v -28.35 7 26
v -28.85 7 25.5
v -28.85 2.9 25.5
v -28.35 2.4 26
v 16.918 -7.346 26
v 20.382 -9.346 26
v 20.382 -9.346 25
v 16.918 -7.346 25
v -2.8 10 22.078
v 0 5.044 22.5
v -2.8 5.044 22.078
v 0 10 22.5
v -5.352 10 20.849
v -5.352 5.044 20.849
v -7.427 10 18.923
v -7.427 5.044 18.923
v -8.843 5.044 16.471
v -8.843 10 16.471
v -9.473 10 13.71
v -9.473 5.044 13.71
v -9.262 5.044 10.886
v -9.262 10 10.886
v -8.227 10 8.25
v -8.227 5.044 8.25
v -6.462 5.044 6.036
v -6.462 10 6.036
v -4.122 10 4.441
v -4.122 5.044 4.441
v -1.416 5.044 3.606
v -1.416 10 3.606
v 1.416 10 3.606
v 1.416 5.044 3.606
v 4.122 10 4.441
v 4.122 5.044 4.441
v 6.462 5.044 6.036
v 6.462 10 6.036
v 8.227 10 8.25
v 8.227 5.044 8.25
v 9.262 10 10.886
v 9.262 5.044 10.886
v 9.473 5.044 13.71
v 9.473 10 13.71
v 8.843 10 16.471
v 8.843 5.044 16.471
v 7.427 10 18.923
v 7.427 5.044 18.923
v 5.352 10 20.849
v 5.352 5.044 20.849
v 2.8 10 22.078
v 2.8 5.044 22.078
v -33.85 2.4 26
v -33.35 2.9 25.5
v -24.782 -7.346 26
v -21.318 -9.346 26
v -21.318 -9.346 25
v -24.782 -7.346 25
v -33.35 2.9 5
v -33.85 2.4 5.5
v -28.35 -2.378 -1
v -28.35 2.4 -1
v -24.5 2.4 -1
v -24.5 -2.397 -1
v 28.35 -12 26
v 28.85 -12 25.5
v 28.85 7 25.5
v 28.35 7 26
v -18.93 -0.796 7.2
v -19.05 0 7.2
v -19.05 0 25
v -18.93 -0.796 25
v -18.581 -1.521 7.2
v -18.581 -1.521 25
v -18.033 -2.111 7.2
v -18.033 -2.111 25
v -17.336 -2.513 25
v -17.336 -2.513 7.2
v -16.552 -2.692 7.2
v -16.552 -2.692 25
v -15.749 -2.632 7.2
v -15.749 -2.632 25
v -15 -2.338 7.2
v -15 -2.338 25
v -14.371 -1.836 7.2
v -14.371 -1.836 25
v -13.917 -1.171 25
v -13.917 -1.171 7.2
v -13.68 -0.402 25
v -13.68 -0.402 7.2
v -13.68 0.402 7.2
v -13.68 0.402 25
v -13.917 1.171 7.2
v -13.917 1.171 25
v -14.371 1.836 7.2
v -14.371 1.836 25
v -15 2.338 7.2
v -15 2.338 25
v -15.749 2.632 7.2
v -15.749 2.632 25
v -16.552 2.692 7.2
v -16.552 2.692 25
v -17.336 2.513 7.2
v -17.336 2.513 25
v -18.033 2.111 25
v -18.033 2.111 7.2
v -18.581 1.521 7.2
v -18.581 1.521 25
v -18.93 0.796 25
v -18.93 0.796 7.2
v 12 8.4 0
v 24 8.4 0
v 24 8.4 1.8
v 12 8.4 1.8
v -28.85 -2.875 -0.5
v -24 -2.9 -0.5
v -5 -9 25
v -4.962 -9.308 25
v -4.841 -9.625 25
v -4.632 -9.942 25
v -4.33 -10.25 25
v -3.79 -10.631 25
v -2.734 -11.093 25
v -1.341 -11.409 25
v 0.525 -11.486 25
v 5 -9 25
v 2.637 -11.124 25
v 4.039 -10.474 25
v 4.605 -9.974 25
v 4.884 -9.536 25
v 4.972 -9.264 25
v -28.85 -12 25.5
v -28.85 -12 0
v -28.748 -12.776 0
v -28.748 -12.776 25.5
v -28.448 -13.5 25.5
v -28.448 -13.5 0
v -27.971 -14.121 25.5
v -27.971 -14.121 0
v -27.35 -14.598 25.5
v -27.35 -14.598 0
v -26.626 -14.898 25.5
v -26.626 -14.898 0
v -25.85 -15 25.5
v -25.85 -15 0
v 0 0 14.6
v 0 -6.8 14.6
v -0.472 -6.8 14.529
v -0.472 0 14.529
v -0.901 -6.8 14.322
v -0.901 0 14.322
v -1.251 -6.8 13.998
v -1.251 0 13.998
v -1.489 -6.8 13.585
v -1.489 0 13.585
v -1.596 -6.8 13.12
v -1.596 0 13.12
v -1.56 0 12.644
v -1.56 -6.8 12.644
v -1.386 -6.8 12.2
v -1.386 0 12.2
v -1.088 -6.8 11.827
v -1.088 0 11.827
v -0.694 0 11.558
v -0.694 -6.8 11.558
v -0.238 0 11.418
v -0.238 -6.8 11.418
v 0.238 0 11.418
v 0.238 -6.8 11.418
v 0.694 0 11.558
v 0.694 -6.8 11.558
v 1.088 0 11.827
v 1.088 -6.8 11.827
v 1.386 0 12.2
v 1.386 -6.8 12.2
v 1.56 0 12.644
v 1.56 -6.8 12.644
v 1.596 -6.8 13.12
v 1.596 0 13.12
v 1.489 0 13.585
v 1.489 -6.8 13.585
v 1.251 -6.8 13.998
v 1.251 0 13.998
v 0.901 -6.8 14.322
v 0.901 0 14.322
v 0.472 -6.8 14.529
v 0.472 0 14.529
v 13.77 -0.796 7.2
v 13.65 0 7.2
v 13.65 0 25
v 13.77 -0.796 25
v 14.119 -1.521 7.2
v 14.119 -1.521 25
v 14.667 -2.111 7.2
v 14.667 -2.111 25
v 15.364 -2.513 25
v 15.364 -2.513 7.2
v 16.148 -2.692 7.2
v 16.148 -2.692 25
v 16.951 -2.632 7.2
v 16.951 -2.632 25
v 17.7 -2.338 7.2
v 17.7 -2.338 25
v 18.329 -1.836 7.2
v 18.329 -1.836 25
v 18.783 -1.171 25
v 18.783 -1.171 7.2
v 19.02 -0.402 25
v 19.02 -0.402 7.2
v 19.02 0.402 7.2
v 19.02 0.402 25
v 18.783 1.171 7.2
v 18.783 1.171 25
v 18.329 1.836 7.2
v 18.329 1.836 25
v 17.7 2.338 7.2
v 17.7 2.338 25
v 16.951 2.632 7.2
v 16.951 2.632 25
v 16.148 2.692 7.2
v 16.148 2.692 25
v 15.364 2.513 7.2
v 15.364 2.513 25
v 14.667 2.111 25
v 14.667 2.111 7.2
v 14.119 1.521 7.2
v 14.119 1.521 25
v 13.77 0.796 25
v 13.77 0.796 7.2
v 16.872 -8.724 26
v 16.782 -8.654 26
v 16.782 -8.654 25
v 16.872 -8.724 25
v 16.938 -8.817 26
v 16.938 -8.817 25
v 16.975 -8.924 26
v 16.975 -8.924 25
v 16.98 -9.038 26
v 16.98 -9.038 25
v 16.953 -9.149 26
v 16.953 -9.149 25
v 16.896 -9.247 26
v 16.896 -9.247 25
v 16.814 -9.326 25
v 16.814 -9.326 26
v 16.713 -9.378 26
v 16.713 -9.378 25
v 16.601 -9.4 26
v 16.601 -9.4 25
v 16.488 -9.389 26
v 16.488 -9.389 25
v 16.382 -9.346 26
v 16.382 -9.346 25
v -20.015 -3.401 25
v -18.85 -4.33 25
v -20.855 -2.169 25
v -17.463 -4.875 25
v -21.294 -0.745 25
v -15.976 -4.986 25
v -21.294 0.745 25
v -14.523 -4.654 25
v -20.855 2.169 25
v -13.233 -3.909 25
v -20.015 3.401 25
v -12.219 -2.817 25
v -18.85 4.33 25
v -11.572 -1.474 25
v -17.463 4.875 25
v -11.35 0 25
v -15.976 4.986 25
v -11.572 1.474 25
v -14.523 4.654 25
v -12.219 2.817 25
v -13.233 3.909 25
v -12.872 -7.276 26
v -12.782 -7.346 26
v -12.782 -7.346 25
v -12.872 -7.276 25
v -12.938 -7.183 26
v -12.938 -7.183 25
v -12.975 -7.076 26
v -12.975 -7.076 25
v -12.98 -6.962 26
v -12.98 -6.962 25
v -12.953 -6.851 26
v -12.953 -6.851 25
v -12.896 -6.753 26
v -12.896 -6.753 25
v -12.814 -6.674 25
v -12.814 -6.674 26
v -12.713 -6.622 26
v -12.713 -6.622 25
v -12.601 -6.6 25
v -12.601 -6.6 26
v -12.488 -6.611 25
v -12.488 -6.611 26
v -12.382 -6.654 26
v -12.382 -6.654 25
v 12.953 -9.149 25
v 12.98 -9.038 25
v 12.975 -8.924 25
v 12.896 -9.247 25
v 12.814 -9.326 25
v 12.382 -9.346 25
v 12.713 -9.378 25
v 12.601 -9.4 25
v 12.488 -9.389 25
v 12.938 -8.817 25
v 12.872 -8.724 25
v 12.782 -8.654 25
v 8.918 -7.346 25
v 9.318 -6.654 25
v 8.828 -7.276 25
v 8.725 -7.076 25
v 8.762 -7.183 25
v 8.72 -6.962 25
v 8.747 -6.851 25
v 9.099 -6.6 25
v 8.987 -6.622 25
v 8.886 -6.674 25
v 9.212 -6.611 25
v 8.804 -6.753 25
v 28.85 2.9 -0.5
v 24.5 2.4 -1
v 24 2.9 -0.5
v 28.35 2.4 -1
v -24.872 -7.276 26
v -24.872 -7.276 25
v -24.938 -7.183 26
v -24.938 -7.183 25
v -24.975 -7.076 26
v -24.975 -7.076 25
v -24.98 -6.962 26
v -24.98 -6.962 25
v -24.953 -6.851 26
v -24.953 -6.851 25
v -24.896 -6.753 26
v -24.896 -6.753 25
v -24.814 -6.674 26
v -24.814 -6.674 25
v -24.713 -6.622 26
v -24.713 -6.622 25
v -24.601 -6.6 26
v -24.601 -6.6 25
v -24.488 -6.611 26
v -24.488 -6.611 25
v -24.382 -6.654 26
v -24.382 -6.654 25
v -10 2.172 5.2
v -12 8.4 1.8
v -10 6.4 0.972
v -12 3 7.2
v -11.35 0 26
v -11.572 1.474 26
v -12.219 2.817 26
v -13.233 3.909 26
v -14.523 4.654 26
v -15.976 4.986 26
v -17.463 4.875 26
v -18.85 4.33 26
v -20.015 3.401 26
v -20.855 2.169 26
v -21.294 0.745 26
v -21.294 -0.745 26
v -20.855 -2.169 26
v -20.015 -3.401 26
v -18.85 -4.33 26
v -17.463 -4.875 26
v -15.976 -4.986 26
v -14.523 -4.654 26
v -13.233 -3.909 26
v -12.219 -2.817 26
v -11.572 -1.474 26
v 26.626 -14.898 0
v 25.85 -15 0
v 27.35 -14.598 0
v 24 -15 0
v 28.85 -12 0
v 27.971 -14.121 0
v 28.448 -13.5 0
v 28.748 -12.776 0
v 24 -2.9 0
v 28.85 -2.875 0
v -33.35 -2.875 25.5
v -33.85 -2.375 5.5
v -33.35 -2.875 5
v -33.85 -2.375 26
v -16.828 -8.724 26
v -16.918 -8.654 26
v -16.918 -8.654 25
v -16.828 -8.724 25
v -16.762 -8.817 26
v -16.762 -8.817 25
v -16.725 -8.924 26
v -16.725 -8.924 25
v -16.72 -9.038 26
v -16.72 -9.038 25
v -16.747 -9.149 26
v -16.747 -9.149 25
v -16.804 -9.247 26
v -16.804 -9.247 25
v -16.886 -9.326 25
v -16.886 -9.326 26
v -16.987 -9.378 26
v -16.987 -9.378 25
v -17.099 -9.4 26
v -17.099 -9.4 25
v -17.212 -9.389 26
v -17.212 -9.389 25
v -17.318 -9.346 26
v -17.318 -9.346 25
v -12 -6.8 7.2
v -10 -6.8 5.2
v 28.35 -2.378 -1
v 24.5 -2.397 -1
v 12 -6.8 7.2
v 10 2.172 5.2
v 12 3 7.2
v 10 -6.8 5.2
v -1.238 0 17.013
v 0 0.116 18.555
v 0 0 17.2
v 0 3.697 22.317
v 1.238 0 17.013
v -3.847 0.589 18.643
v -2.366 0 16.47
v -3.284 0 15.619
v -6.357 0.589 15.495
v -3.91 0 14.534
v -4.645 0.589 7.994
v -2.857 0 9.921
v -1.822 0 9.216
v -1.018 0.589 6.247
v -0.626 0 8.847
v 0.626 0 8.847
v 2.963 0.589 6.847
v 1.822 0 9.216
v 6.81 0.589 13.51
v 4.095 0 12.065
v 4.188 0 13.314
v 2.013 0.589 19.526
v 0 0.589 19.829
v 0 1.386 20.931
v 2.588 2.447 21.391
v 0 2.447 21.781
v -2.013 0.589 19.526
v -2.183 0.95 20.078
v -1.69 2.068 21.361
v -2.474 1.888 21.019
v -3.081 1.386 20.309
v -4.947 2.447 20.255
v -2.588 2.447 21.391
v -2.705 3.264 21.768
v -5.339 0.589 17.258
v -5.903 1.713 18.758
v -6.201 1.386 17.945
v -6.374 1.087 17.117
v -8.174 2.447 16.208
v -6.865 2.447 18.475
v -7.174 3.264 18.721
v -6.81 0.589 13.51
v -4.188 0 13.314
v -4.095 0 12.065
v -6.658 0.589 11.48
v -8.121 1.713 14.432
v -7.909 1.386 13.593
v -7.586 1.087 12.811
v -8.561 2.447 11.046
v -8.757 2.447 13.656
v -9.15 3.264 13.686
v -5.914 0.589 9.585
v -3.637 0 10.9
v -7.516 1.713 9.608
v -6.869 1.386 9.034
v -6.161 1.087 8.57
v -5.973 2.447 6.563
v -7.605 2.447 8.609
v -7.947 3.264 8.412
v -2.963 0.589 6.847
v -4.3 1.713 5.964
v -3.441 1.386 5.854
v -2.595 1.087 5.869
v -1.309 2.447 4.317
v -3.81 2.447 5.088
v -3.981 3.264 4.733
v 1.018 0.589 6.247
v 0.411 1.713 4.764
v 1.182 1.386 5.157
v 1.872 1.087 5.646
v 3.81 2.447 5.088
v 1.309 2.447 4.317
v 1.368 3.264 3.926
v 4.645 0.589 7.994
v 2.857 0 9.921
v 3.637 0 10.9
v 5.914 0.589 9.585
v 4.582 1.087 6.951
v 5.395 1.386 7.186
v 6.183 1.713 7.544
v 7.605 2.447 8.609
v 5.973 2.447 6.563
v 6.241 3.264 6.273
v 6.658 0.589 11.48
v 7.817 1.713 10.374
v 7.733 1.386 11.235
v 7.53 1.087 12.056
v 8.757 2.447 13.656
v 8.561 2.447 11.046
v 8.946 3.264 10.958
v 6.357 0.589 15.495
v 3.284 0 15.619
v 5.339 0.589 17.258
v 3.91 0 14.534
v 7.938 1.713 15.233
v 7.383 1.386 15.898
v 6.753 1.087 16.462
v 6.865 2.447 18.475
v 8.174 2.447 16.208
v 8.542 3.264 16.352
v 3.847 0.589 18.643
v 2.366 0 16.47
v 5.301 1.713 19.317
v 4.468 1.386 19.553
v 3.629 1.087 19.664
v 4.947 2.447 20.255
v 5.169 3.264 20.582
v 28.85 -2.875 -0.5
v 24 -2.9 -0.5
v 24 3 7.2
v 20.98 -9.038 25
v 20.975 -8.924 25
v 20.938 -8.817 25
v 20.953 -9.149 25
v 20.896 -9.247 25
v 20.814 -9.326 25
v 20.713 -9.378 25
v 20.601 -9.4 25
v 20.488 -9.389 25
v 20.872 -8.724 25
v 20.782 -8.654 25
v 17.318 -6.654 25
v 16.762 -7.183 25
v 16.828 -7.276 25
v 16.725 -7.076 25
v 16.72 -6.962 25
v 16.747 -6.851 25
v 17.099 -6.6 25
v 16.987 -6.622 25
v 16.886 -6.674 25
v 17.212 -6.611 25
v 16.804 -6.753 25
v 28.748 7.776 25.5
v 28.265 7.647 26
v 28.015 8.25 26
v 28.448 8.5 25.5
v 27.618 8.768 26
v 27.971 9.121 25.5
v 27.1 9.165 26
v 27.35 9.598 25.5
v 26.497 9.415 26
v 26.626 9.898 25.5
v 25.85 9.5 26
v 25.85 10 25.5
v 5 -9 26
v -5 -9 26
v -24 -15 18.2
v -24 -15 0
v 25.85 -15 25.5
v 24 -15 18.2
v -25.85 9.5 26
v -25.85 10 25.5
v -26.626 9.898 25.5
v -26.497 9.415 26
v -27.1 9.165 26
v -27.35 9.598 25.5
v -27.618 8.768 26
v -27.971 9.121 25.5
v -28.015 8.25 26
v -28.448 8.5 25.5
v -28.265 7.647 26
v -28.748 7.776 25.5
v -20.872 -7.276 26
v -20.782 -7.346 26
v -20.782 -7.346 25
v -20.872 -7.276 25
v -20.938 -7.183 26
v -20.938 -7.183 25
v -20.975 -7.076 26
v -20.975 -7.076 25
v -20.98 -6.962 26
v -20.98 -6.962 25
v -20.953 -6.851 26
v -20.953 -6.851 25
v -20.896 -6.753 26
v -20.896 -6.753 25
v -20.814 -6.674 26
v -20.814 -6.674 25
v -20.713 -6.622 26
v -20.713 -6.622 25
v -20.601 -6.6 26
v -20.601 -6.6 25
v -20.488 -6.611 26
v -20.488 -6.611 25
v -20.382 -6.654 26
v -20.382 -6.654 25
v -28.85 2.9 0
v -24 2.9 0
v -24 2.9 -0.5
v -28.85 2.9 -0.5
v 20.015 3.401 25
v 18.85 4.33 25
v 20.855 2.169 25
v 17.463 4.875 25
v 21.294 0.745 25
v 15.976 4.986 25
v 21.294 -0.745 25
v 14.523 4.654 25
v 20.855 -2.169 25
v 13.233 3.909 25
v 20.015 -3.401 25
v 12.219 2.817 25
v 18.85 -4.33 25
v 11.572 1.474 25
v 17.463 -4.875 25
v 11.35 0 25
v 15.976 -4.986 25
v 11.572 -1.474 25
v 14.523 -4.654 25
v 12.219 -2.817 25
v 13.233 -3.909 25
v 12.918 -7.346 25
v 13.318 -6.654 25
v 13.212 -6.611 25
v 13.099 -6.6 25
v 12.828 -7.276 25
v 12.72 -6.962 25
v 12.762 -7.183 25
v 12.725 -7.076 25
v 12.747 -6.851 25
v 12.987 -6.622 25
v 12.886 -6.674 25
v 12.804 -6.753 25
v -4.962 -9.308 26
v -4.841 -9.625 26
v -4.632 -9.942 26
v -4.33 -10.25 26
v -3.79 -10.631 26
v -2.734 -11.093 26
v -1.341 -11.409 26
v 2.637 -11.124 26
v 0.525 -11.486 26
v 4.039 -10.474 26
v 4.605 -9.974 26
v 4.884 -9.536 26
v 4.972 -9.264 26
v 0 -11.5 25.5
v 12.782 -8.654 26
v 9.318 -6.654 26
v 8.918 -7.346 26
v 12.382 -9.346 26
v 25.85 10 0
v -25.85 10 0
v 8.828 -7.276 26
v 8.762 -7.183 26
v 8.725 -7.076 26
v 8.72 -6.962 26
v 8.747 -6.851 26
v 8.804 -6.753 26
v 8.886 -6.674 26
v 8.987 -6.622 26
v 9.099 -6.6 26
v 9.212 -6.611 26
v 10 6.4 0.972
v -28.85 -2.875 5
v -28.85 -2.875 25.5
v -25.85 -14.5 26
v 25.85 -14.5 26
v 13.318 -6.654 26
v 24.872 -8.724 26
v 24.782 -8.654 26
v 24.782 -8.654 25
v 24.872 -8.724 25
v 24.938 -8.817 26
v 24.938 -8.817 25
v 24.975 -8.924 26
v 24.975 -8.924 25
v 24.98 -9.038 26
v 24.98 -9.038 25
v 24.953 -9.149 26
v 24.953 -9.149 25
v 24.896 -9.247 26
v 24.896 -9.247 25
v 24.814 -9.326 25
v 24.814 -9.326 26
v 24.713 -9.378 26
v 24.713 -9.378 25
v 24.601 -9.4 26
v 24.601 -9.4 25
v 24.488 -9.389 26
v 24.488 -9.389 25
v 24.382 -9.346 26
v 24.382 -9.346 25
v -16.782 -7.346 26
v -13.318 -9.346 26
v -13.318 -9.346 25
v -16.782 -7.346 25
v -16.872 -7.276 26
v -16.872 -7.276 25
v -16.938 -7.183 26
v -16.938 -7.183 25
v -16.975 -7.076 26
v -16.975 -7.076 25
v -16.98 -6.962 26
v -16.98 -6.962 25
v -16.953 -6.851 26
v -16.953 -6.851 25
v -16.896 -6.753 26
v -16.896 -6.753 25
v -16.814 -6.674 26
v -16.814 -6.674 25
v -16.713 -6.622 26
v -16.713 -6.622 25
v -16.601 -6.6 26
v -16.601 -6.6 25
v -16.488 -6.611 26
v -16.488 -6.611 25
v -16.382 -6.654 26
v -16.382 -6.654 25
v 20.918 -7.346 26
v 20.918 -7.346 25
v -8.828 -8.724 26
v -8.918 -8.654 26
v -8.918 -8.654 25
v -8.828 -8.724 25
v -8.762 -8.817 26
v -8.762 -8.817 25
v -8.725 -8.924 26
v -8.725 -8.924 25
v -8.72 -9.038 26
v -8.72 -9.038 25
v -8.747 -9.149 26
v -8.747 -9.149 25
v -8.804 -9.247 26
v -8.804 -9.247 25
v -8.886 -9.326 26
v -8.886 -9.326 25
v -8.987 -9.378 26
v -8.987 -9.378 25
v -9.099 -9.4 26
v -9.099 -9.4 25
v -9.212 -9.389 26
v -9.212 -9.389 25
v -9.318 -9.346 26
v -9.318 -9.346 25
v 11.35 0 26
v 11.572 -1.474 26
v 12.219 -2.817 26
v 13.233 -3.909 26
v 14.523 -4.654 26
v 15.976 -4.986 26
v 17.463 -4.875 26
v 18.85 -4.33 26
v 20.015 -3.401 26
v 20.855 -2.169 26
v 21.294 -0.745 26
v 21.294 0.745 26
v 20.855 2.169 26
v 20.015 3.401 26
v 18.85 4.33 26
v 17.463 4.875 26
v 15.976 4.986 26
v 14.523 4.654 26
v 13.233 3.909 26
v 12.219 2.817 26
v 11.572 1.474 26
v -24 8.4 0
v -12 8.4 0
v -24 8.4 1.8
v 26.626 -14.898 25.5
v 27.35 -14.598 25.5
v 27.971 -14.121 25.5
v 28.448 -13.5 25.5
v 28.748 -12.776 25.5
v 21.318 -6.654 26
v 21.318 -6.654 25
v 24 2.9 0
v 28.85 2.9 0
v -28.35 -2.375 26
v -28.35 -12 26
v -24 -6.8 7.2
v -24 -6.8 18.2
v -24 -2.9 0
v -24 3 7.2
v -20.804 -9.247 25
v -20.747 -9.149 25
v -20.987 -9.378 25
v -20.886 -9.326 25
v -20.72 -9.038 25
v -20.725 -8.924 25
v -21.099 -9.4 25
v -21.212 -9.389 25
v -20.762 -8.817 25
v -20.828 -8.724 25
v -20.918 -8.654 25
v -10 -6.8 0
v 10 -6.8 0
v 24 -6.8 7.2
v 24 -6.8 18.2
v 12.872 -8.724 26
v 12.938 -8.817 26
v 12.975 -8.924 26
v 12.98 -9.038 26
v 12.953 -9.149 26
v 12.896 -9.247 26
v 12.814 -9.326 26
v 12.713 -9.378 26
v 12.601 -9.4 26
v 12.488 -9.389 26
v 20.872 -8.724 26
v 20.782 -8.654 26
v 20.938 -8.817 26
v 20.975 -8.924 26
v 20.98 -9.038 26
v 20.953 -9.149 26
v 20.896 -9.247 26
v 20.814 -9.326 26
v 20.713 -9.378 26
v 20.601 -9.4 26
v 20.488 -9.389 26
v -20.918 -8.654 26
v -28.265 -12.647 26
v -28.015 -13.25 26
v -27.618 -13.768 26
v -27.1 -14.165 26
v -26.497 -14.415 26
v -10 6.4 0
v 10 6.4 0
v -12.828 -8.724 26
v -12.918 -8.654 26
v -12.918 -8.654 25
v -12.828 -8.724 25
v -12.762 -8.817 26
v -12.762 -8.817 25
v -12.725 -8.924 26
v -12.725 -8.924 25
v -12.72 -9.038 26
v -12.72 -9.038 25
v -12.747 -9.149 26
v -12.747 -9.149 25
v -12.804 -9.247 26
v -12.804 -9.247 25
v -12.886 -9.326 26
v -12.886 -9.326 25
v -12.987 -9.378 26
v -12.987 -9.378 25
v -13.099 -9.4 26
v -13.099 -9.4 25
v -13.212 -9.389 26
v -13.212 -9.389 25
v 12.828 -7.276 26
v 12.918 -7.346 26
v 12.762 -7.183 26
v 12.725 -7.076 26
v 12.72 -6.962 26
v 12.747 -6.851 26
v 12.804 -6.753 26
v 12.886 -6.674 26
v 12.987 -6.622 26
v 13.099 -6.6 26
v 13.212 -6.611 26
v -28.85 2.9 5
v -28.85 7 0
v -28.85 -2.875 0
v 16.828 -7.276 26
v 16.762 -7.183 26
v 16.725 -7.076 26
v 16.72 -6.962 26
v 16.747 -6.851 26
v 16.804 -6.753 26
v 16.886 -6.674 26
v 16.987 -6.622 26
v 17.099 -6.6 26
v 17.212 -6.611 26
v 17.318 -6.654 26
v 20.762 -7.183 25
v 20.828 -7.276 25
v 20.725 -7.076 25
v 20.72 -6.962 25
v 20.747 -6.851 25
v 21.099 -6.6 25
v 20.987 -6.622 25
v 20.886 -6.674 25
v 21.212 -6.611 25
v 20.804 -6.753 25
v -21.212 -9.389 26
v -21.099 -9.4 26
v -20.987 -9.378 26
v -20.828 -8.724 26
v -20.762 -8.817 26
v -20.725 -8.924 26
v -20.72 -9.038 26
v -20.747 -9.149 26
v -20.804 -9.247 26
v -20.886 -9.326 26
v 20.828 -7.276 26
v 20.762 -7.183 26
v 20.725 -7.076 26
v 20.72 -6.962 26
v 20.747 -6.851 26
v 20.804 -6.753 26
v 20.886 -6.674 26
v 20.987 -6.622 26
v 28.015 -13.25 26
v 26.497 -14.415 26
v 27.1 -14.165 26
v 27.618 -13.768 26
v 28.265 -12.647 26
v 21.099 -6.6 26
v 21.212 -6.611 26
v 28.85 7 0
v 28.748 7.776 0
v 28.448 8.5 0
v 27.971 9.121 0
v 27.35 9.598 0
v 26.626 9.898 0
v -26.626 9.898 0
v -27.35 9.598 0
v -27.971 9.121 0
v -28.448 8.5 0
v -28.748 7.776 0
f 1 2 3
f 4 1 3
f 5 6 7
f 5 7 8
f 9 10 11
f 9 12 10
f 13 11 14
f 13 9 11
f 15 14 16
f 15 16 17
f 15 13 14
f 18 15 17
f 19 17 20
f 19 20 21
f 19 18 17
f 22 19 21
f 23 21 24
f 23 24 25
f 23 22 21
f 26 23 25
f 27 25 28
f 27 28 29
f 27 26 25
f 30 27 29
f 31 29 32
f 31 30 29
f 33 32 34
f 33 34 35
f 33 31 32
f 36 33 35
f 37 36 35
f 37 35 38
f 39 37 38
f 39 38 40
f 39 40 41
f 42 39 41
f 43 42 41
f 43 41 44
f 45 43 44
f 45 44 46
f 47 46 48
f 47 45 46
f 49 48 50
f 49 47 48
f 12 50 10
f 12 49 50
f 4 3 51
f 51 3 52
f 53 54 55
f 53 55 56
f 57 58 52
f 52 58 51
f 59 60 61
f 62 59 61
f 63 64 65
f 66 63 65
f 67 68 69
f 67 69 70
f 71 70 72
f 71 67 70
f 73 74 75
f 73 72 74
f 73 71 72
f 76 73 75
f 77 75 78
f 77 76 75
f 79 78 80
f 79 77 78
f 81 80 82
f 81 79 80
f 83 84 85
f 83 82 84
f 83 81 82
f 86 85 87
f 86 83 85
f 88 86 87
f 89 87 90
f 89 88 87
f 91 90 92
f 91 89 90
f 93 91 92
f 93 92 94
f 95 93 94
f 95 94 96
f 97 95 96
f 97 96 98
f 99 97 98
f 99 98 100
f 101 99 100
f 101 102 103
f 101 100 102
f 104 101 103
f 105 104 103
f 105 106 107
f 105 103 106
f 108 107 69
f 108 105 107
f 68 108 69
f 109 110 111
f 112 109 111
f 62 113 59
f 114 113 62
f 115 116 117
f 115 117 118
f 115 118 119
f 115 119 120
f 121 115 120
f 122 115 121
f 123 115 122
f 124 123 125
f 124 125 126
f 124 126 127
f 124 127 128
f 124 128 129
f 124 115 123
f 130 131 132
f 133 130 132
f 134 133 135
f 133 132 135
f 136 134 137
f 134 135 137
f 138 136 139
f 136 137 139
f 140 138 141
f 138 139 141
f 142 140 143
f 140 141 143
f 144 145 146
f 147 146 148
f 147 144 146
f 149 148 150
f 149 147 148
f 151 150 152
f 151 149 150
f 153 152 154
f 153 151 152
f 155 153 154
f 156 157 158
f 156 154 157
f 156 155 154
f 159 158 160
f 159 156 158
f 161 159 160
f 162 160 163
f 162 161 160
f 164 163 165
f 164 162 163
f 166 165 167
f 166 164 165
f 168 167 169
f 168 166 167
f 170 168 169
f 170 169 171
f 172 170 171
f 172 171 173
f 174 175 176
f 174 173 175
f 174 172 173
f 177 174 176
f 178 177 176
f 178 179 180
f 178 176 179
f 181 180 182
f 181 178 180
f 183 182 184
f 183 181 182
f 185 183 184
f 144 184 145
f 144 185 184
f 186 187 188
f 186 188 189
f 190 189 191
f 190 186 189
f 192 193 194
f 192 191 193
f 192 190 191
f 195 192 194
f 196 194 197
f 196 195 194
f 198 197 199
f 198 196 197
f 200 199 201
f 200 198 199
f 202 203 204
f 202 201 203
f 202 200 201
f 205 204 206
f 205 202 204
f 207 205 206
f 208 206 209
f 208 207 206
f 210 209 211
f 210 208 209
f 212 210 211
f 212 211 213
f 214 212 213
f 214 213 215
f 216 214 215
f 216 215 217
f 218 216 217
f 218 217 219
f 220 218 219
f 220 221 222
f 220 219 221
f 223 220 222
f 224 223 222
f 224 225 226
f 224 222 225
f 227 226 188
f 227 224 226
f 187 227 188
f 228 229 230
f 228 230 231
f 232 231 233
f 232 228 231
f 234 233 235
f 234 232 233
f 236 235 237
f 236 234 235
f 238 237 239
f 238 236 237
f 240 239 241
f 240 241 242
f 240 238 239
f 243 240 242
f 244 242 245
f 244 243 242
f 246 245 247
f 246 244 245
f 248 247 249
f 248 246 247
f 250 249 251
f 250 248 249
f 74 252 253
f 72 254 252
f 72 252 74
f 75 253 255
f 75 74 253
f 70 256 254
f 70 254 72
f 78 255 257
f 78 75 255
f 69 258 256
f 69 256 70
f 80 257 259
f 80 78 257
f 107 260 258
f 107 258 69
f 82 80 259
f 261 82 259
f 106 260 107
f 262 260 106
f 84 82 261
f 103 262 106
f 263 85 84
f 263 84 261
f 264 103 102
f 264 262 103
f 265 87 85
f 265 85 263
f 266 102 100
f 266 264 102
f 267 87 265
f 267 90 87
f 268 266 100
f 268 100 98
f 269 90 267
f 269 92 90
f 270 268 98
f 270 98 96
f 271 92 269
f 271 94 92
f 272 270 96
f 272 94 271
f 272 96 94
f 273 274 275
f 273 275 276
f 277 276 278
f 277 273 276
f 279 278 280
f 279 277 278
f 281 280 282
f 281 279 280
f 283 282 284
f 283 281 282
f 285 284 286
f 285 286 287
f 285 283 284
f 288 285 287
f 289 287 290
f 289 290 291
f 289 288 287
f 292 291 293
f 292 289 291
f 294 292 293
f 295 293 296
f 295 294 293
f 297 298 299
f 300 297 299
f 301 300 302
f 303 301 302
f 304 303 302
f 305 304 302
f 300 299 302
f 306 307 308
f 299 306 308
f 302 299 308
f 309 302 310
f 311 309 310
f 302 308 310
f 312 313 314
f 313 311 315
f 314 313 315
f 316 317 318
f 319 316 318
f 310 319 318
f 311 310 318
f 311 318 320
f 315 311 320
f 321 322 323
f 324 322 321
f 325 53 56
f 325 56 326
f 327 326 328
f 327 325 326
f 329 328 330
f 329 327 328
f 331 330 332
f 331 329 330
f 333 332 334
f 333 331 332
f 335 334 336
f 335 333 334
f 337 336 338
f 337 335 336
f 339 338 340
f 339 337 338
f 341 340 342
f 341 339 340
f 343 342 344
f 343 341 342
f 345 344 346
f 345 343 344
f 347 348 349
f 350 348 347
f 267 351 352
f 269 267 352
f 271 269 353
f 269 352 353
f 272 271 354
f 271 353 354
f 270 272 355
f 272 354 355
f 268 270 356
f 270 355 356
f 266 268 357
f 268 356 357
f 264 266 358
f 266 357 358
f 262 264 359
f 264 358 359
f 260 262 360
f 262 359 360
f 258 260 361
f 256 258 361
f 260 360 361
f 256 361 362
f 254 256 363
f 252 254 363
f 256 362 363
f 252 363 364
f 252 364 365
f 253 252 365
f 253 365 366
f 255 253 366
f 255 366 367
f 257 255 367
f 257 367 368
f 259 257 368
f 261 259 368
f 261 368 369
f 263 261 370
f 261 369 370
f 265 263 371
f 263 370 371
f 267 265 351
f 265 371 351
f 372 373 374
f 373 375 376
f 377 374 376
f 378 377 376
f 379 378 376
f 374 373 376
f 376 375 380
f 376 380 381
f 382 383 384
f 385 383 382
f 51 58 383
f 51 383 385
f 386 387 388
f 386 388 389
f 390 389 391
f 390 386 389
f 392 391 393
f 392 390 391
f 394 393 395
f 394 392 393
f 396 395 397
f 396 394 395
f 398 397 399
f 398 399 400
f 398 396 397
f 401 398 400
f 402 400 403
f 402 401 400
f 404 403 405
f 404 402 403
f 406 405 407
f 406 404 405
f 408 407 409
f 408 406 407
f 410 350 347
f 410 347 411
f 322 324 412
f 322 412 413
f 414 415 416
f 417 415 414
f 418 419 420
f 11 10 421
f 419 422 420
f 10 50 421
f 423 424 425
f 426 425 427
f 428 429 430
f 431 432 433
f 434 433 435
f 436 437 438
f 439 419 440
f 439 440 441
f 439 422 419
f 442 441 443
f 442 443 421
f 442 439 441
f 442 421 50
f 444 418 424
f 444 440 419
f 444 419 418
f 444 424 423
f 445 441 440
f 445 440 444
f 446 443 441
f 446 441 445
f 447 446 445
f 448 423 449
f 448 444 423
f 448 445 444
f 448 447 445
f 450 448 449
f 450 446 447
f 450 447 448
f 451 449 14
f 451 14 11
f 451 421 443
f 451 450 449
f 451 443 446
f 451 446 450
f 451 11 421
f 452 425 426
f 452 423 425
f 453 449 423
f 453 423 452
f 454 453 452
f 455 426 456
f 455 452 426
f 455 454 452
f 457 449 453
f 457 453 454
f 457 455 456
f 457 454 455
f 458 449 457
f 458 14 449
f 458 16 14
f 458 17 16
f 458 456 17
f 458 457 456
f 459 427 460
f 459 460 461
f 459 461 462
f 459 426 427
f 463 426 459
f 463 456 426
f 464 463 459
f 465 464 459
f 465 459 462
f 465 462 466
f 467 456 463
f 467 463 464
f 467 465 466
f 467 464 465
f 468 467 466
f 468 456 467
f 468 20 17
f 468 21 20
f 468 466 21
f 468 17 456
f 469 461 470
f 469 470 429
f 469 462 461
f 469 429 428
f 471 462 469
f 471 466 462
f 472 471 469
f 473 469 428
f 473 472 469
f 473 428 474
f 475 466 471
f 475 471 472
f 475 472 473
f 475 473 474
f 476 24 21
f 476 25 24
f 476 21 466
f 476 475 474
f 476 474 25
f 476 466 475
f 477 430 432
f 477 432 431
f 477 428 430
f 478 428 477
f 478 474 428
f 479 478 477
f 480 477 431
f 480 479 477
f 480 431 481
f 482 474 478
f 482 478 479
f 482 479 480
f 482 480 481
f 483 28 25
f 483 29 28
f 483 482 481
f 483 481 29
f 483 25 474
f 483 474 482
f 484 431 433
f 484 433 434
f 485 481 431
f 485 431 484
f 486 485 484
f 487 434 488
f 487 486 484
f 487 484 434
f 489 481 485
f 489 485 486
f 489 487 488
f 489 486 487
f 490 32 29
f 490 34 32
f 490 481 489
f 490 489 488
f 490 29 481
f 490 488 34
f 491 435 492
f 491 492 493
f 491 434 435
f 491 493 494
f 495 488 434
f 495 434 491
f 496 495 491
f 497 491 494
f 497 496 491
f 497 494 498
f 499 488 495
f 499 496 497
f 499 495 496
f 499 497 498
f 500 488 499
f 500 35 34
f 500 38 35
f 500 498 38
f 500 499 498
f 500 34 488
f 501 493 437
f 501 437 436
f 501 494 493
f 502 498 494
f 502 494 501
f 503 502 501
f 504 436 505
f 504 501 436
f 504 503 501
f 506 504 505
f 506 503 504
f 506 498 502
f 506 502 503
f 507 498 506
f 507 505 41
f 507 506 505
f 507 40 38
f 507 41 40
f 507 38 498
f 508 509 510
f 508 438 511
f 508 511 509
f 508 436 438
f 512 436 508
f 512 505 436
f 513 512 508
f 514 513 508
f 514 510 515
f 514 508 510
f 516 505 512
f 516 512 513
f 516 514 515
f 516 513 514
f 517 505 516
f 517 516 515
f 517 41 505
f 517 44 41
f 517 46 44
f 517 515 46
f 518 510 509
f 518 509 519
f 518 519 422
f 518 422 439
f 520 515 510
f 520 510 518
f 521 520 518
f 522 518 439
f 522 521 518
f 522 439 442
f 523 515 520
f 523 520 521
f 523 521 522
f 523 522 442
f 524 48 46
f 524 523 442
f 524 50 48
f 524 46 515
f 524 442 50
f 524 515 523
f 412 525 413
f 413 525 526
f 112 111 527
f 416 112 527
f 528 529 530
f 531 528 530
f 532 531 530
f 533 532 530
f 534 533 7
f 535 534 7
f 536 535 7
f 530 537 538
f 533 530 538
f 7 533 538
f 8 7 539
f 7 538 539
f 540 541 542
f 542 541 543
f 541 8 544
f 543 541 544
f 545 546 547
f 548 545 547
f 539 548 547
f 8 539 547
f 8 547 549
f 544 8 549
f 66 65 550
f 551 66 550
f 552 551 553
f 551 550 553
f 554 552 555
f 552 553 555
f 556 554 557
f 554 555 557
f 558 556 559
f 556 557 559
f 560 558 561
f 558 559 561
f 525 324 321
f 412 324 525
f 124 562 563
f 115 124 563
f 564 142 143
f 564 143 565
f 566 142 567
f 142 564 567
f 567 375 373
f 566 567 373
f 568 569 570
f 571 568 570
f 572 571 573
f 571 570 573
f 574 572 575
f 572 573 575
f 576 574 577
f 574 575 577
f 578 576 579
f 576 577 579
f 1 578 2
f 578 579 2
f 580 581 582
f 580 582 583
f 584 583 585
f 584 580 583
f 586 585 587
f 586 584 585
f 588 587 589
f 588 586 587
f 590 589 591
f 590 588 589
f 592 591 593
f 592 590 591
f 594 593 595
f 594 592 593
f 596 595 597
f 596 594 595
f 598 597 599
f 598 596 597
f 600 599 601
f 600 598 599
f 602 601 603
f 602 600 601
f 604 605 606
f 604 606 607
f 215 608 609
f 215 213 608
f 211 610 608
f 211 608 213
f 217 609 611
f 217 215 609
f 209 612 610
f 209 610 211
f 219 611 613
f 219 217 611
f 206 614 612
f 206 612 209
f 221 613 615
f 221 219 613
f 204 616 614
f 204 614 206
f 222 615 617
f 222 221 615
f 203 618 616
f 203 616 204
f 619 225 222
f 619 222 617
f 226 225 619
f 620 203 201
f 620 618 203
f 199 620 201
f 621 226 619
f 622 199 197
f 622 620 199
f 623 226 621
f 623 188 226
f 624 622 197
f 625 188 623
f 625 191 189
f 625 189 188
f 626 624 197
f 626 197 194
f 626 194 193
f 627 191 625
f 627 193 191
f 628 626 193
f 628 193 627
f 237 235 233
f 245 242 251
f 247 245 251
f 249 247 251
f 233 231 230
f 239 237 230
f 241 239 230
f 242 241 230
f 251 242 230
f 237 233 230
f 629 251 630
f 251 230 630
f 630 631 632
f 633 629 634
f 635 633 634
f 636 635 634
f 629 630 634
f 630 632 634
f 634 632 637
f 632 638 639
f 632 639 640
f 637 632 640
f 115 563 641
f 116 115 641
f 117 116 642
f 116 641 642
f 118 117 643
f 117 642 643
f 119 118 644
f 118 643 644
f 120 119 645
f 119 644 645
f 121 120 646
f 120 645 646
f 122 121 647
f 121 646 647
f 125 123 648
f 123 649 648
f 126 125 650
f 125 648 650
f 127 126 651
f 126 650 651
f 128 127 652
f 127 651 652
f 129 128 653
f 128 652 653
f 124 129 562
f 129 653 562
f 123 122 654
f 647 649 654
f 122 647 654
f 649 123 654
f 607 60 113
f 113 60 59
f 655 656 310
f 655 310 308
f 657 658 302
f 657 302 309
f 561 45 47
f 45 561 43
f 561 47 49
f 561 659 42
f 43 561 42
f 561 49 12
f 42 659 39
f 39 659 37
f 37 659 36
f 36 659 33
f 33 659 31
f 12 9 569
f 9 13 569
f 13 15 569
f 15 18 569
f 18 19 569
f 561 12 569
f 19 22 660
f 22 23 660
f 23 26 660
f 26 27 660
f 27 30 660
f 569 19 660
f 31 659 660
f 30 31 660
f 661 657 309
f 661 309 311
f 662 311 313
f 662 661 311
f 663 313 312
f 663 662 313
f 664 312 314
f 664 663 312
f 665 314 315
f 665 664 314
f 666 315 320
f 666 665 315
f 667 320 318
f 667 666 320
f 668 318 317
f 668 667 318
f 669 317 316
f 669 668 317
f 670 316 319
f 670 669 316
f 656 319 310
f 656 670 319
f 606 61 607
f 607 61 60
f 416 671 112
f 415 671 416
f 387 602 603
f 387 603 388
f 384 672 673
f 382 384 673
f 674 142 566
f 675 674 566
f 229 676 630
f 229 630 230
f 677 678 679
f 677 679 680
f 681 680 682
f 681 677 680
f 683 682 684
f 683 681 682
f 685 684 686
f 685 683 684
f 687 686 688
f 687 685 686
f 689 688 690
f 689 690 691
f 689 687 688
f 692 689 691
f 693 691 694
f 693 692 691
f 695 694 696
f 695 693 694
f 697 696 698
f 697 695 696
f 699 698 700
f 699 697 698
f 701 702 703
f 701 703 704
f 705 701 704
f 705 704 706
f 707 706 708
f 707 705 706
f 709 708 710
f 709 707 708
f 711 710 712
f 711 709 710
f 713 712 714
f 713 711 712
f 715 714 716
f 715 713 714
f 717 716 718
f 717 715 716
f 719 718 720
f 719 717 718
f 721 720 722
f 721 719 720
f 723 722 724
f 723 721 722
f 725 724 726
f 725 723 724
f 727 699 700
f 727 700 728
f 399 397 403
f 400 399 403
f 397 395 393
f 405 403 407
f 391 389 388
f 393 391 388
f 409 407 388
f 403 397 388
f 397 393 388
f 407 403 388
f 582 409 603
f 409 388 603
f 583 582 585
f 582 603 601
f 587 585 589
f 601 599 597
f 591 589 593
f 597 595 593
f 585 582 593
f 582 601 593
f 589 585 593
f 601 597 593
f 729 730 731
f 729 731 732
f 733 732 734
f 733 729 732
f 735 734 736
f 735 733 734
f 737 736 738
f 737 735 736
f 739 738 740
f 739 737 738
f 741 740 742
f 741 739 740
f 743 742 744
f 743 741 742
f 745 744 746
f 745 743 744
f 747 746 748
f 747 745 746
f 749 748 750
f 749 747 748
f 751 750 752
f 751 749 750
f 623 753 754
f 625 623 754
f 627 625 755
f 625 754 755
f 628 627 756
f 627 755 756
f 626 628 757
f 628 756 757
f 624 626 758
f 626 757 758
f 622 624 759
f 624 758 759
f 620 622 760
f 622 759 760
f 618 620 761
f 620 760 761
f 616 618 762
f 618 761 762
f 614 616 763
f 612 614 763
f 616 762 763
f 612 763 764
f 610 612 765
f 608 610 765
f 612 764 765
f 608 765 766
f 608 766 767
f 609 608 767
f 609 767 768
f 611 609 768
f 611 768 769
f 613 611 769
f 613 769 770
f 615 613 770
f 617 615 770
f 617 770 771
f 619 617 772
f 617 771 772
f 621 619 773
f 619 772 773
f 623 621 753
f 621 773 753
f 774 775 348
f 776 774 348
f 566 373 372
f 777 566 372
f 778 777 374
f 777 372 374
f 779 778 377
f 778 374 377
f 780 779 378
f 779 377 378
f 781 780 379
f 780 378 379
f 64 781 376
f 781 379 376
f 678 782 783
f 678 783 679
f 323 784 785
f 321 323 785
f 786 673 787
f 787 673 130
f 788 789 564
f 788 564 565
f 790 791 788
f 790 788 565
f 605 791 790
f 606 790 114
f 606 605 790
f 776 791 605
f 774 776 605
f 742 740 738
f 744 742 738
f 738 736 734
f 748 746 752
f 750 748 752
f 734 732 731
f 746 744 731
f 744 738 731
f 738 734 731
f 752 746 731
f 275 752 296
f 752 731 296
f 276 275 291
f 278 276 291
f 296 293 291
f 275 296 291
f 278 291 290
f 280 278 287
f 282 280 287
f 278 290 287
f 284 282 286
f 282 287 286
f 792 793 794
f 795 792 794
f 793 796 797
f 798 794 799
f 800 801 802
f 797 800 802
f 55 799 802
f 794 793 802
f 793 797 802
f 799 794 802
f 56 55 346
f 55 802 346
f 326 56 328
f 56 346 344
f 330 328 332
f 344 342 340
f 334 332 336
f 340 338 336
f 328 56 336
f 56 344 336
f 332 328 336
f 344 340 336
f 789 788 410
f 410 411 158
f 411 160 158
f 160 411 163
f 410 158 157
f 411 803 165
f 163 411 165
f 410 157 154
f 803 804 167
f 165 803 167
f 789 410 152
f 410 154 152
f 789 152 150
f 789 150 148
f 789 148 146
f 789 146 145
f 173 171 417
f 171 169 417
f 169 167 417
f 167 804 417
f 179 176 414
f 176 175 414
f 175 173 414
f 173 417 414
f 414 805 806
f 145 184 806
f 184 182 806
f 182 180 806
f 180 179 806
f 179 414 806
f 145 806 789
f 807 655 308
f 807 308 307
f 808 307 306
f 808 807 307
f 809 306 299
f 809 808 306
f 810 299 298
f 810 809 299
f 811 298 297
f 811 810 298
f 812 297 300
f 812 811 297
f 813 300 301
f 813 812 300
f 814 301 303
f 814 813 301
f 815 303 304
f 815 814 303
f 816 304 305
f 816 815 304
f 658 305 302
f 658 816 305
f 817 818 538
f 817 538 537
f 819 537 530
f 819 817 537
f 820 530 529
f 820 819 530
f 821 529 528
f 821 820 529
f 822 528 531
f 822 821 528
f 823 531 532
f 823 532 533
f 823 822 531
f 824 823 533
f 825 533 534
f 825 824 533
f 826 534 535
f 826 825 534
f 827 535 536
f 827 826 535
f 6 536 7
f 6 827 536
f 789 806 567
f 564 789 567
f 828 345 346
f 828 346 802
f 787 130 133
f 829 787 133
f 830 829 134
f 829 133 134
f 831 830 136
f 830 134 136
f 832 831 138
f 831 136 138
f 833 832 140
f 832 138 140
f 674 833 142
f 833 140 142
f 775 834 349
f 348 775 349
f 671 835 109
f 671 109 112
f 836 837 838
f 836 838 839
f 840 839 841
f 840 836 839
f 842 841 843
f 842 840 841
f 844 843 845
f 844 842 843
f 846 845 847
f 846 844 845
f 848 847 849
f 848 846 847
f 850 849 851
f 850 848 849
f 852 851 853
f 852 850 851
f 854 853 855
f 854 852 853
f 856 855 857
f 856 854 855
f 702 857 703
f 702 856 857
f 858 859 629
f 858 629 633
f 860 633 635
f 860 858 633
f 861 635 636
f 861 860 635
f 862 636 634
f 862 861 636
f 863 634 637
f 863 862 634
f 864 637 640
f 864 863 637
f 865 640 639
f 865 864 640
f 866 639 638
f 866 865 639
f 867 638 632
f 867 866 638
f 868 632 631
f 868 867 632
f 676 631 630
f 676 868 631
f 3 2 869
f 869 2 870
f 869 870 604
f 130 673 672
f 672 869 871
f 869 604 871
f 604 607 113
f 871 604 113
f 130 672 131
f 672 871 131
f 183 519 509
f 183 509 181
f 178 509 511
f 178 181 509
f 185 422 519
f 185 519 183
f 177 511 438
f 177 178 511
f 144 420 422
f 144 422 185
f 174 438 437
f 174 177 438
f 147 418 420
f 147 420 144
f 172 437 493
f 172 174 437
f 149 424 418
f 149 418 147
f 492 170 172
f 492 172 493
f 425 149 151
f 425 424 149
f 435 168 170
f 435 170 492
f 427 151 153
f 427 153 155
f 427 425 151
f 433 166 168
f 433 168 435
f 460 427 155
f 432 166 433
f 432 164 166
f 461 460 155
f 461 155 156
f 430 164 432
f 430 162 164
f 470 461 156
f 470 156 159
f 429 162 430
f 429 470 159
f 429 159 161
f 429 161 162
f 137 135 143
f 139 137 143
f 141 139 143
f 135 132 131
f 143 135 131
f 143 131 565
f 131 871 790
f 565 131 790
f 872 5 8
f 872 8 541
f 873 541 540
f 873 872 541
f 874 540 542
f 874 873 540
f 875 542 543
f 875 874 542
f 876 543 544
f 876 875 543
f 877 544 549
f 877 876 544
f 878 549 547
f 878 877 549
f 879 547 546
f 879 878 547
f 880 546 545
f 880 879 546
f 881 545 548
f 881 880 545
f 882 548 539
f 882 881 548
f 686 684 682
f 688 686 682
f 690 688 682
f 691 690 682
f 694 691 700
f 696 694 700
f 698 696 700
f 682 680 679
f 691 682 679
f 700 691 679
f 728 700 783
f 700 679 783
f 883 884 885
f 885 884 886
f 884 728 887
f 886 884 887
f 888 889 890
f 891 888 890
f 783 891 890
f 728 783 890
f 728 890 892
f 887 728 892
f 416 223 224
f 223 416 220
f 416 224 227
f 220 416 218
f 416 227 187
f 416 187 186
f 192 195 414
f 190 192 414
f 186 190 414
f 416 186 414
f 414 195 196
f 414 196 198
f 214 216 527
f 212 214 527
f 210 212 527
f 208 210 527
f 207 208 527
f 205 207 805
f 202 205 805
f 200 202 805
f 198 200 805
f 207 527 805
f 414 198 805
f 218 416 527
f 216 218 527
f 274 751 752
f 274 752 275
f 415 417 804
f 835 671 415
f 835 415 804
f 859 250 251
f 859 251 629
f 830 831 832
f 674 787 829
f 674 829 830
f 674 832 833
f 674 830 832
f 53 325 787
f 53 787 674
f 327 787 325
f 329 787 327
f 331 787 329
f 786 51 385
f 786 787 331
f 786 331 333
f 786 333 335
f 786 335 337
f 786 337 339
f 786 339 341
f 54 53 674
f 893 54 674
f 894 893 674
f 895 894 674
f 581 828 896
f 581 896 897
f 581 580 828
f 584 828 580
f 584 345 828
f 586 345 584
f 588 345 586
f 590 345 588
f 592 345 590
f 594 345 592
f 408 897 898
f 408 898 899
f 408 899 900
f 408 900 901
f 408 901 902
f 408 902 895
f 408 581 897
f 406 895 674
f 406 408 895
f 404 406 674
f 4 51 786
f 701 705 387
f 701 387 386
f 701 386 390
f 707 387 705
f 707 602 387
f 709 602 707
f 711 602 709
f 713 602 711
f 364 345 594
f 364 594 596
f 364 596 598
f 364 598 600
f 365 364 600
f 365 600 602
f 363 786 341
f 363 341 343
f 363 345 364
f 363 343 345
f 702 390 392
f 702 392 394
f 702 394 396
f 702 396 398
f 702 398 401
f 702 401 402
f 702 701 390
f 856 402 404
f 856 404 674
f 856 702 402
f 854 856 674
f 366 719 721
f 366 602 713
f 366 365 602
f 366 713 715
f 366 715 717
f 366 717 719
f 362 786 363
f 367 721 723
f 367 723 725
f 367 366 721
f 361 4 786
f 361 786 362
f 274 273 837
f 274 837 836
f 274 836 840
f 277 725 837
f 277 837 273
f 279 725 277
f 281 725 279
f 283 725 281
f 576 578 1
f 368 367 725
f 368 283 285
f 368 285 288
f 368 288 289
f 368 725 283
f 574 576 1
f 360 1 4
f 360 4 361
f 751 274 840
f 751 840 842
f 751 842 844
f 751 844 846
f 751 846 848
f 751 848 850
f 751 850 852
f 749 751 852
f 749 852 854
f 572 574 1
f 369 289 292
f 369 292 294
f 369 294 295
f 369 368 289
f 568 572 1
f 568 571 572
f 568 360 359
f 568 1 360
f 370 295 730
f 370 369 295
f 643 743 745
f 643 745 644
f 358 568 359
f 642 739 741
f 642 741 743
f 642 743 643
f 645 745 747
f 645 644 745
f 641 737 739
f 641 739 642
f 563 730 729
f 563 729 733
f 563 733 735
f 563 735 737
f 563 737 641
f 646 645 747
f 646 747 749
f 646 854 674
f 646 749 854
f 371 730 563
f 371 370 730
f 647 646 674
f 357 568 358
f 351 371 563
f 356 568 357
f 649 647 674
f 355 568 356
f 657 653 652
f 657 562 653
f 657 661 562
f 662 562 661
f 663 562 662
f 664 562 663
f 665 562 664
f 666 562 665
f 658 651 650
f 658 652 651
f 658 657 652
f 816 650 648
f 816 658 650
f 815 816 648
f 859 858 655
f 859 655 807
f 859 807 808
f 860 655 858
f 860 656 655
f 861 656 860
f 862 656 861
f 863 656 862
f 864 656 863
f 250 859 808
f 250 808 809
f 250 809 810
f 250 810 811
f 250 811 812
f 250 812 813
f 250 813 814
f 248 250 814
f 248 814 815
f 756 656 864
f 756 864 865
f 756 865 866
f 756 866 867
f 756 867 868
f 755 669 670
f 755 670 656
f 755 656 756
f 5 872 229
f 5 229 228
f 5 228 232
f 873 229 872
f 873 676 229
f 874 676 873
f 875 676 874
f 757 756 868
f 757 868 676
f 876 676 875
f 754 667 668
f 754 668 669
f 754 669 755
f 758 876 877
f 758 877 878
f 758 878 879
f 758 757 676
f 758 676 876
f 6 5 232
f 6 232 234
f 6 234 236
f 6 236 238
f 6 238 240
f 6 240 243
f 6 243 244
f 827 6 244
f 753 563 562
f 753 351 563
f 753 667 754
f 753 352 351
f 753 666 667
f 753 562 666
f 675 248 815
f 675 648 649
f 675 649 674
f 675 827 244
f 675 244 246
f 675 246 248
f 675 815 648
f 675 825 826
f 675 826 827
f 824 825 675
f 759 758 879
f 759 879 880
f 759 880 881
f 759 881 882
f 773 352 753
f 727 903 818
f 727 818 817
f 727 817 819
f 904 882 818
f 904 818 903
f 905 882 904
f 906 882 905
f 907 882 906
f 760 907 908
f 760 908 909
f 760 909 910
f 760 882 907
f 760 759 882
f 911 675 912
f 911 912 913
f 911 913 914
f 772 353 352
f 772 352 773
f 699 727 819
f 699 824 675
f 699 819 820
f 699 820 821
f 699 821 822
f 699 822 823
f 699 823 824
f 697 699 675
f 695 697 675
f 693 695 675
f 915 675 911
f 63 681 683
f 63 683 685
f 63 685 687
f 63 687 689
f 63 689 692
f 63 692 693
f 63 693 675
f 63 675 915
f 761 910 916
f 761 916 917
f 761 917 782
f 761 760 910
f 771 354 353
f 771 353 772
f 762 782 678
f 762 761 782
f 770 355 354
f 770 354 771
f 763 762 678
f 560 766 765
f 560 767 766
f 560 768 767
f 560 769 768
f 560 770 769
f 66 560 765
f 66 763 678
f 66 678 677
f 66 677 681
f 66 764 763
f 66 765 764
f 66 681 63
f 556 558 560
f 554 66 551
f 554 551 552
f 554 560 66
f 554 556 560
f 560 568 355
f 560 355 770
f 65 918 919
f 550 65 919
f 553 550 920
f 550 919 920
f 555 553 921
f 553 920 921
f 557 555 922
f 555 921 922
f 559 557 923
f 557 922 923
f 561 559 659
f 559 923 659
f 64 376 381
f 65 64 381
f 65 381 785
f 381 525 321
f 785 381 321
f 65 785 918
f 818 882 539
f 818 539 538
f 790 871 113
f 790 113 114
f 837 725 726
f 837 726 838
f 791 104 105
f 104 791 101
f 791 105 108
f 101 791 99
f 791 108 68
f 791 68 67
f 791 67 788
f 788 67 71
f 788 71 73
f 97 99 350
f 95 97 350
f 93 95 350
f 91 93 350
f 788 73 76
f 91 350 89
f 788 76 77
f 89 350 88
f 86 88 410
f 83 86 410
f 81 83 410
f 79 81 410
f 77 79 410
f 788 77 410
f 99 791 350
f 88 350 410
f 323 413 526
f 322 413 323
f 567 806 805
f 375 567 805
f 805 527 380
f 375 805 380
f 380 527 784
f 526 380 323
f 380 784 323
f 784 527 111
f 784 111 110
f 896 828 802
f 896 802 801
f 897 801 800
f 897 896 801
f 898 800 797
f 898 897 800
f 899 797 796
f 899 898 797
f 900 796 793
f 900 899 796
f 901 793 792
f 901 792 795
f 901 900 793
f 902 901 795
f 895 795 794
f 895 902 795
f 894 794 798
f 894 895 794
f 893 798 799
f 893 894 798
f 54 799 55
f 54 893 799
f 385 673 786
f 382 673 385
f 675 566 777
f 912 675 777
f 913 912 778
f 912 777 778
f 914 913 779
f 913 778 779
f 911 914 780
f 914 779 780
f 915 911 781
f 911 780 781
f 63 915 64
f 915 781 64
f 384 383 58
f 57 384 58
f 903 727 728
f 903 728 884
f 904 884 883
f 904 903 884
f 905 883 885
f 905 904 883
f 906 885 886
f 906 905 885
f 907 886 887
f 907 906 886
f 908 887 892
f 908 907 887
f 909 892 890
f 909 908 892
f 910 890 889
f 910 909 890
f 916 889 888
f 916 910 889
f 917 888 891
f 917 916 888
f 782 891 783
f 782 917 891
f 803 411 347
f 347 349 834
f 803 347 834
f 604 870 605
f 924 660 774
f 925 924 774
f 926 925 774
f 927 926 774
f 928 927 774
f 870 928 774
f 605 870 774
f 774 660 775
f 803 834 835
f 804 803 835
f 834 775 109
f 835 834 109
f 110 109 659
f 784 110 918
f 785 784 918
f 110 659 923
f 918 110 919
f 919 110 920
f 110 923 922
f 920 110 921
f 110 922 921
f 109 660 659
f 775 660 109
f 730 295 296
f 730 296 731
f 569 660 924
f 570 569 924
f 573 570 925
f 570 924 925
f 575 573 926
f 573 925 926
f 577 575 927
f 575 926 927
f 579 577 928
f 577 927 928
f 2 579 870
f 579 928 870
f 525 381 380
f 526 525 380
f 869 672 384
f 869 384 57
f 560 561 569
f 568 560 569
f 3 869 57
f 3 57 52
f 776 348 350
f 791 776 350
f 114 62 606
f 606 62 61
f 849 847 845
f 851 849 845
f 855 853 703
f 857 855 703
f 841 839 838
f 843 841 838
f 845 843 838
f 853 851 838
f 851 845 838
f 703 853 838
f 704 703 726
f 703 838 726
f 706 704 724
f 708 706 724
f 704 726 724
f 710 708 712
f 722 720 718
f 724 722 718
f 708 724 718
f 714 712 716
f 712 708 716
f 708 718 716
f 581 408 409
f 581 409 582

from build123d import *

# Parameters (mm, degrees)
SKETCH_3_R          = 2.7
EXTRUDE_2_DEPTH     = 26
SKETCH_5_R          = 5
CUT_EXTRUDE_1_DEPTH = 1
CUT_EXTRUDE_2_DEPTH = 1
CUT_EXTRUDE_3_DEPTH = 24
EXTRUDE_3_DEPTH     = 1
CHAMFER_1_SIZE      = 0.5
SKETCH_9_W          = 21
SKETCH_9_H          = 5.775015532
EXTRUDE_4_DEPTH     = 5
CHAMFER_3_SIZE      = 0.5
EXTRUDE_5_DEPTH     = 10
CHAMFER_4_SIZE      = 2


with BuildPart() as part:
    # 草图3 → 凸台-拉伸2 (new body)
    with BuildSketch(Plane.XY):
        with BuildLine():
            Line((25.85, 10), (-25.85, 10))
            ThreePointArc((-25.85, 10), (-27.971320344, 9.121320344), (-28.85, 7))
            Line((-28.85, 7), (-28.85, 0))
            Line((-28.85, 0), (-28.85, -12))
            ThreePointArc((-28.85, -12), (-27.971320344, -14.121320344), (-25.85, -15))
            Line((-25.85, -15), (25.85, -15))
            ThreePointArc((25.85, -15), (27.971320344, -14.121320344), (28.85, -12))
            Line((28.85, -12), (28.85, 0))
            Line((28.85, 0), (28.85, 7))
            ThreePointArc((28.85, 7), (27.971320344, 9.121320344), (25.85, 10))
        make_face()
        with Locations((-16.35, 0)):
            Circle(SKETCH_3_R, mode=Mode.SUBTRACT)
        with Locations((16.35, 0)):
            Circle(SKETCH_3_R, mode=Mode.SUBTRACT)
    extrude(amount=EXTRUDE_2_DEPTH)

    # 草图5 → 切除-拉伸1 (cut)
    with BuildSketch(Plane.XY.offset(26)):
        with Locations((-16.35, 0)):
            Circle(SKETCH_5_R)
        with Locations((16.35, 0)):
            Circle(SKETCH_5_R)
    extrude(amount=-CUT_EXTRUDE_1_DEPTH, mode=Mode.SUBTRACT)

    # 草图6 → 切除-拉伸2 (cut)
    with BuildSketch(Plane.XY.offset(26)):
        with BuildLine():
            Line((5, -9.000269215), (-5, -9.000269215))
            add(Edge.make_bspline(
                [(-5, -9.000269215), (-5, -11.500269215), (0, -11.500269215), (5, -11.500269215), (5, -9.000269215)],
                knots=[3.141592654, 3.141592654, 3.141592654, 4.71238898, 4.71238898, 6.283185307, 6.283185307, 6.283185307], degree=2, weights=[1, 0.707106781, 1, 0.707106781, 1]))
        make_face()
        with BuildLine():
            Line((-21.317949192, -9.346410161), (-24.782050808, -7.346410161))
            ThreePointArc((-24.782050808, -7.346410161), (-24.928460969, -6.8), (-24.382050808, -6.653589838))
            Line((-24.382050808, -6.653589838), (-20.917949192, -8.653589838))
            ThreePointArc((-20.917949192, -8.653589838), (-20.771539031, -9.2), (-21.317949192, -9.346410161))
        make_face()
        with BuildLine():
            Line((-17.317949192, -9.346410161), (-20.782050808, -7.346410161))
            ThreePointArc((-20.782050808, -7.346410161), (-20.928460969, -6.8), (-20.382050808, -6.653589838))
            Line((-20.382050808, -6.653589838), (-16.917949192, -8.653589838))
            ThreePointArc((-16.917949192, -8.653589838), (-16.771539031, -9.2), (-17.317949192, -9.346410161))
        make_face()
        with BuildLine():
            Line((-13.317949192, -9.346410161), (-16.782050808, -7.346410161))
            ThreePointArc((-16.782050808, -7.346410161), (-16.928460969, -6.8), (-16.382050808, -6.653589838))
            Line((-16.382050808, -6.653589838), (-12.917949192, -8.653589838))
            ThreePointArc((-12.917949192, -8.653589838), (-12.771539031, -9.2), (-13.317949192, -9.346410161))
        make_face()
        with BuildLine():
            Line((-9.317949192, -9.346410161), (-12.782050808, -7.346410161))
            ThreePointArc((-12.782050808, -7.346410161), (-12.928460969, -6.8), (-12.382050808, -6.653589838))
            Line((-12.382050808, -6.653589838), (-8.917949192, -8.653589838))
            ThreePointArc((-8.917949192, -8.653589838), (-8.771539031, -9.2), (-9.317949192, -9.346410161))
        make_face()
        with BuildLine():
            Line((12.382050808, -9.346410161), (8.917949192, -7.346410161))
            ThreePointArc((8.917949192, -7.346410161), (8.771539031, -6.8), (9.317949192, -6.653589838))
            Line((9.317949192, -6.653589838), (12.782050808, -8.653589838))
            ThreePointArc((12.782050808, -8.653589838), (12.928460969, -9.2), (12.382050808, -9.346410161))
        make_face()
        with BuildLine():
            Line((16.382050808, -9.346410161), (12.917949192, -7.346410161))
            ThreePointArc((12.917949192, -7.346410161), (12.771539031, -6.8), (13.317949192, -6.653589838))
            Line((13.317949192, -6.653589838), (16.782050808, -8.653589838))
            ThreePointArc((16.782050808, -8.653589838), (16.928460969, -9.2), (16.382050808, -9.346410161))
        make_face()
        with BuildLine():
            Line((20.382050808, -9.346410161), (16.917949192, -7.346410161))
            ThreePointArc((16.917949192, -7.346410161), (16.771539031, -6.8), (17.317949192, -6.653589838))
            Line((17.317949192, -6.653589838), (20.782050808, -8.653589838))
            ThreePointArc((20.782050808, -8.653589838), (20.928460969, -9.2), (20.382050808, -9.346410161))
        make_face()
        with BuildLine():
            Line((24.382050808, -9.346410161), (20.917949192, -7.346410161))
            ThreePointArc((20.917949192, -7.346410161), (20.771539031, -6.8), (21.317949192, -6.653589838))
            Line((21.317949192, -6.653589838), (24.782050808, -8.653589838))
            ThreePointArc((24.782050808, -8.653589838), (24.928460969, -9.2), (24.382050808, -9.346410161))
        make_face()
    extrude(amount=-CUT_EXTRUDE_2_DEPTH, mode=Mode.SUBTRACT)

    # 草图7 → 切除-拉伸3 (cut, symmetric)
    with BuildSketch(Plane(origin=(0, 0, 0), x_dir=(0, 0, -1), z_dir=(1, 0, 0))):
        Polygon((0, 8.4), (-1.8, 8.4), (-7.2, 3), (-7.2, -6.8), (-18.2, -6.8), (-18.2, -15), (0, -15), align=None)
    extrude(amount=CUT_EXTRUDE_3_DEPTH, both=True, mode=Mode.SUBTRACT)

    # 草图8 → 凸台-拉伸3 (add)
    with BuildSketch(Plane.XY):
        Polygon((-24, 2.9), (-28.85, 2.9), (-28.85, -2.875015532), (-24, -2.9), align=None)
        Polygon((28.85, -2.875015532), (24, -2.9), (24, 2.9), (28.85, 2.9), align=None)
    extrude(amount=-EXTRUDE_3_DEPTH)

    # 倒角1
    chamfer_1_edges = [part.edges().sort_by_distance(p)[0] for p in [
        (-26.425, 2.9, -1),
        (-28.85, 0.012492234, -1),
        (-26.425, -2.887507766, -1),
        (-24, 0, -1),
        (26.425, 2.9, -1),
        (24, 0, -1),
        (26.425, -2.887507766, -1),
        (28.85, 0.012492234, -1),
    ]]
    chamfer(chamfer_1_edges, length=CHAMFER_1_SIZE)

    # 草图9 → 凸台-拉伸4 (add)
    with BuildSketch(Plane.ZY.offset(28.85)):
        with Locations((15.5, 0.012492234)):
            Rectangle(SKETCH_9_W, SKETCH_9_H)
    extrude(amount=EXTRUDE_4_DEPTH)

    # 倒角3
    chamfer_3_edges = [part.edges().sort_by_distance(p)[0] for p in [
        (-31.35, -2.875015532, 26),
        (-33.85, -2.875015532, 15.5),
        (-33.85, 0.012492234, 5),
        (-33.85, 2.9, 15.5),
        (-31.35, 2.9, 26),
        (-28.85, -7.437507766, 26),
        (-27.971320344, -14.121320344, 26),
        (0, -15, 26),
        (27.971320344, -14.121320344, 26),
        (28.85, -2.5, 26),
        (-28.85, 4.95, 26),
        (27.971320344, 9.121320344, 26),
        (-27.971320344, 9.121320344, 26),
        (0, 10, 26),
    ]]
    chamfer(chamfer_3_edges, length=CHAMFER_3_SIZE)

    # 草图10 → 凸台-拉伸5 (add, symmetric)
    with BuildSketch(Plane(origin=(0, 0, 0), x_dir=(0, 0, -1), z_dir=(1, 0, 0))):
        Polygon((-7.2, -6.8), (0, -6.8), (0, 8.4), (-1.8, 8.4), (-7.2, 3), align=None)
    extrude(amount=EXTRUDE_5_DEPTH, both=True)

    # 倒角4
    chamfer_4_edges = [part.edges().sort_by_distance(p)[0] for p in [
        (-10, -1.9, 7.2),
        (-10, 5.7, 4.5),
        (-10, 8.4, 0.9),
        (10, -1.9, 7.2),
        (10, 8.4, 0.9),
        (10, 5.7, 4.5),
    ]]
    chamfer(chamfer_4_edges, length=CHAMFER_4_SIZE)

    # 草图4 → 切除-旋转1 (revolve, cut)
    with BuildSketch(Plane(origin=(0, 0, 0), x_dir=(0, 0, -1), z_dir=(1, 0, 0))):
        with BuildLine():
            Line((-13, 10), (-13, -15))
            Line((-13, -15), (-11.4, -15))
            Line((-11.4, -15), (-11.4, 0))
            Line((-11.4, 0), (-8.8, 0))
            ThreePointArc((-8.8, 0), (-5.068620963, 1.38559814), (-3.5, 5.043808085))
            Line((-3.5, 5.043808085), (-3.5, 10))
            Line((-3.5, 10), (-13, 10))
        make_face()
    revolve(axis=Axis((0, 10, 13), (0, -1, 0)), mode=Mode.SUBTRACT)


solid = part.part
